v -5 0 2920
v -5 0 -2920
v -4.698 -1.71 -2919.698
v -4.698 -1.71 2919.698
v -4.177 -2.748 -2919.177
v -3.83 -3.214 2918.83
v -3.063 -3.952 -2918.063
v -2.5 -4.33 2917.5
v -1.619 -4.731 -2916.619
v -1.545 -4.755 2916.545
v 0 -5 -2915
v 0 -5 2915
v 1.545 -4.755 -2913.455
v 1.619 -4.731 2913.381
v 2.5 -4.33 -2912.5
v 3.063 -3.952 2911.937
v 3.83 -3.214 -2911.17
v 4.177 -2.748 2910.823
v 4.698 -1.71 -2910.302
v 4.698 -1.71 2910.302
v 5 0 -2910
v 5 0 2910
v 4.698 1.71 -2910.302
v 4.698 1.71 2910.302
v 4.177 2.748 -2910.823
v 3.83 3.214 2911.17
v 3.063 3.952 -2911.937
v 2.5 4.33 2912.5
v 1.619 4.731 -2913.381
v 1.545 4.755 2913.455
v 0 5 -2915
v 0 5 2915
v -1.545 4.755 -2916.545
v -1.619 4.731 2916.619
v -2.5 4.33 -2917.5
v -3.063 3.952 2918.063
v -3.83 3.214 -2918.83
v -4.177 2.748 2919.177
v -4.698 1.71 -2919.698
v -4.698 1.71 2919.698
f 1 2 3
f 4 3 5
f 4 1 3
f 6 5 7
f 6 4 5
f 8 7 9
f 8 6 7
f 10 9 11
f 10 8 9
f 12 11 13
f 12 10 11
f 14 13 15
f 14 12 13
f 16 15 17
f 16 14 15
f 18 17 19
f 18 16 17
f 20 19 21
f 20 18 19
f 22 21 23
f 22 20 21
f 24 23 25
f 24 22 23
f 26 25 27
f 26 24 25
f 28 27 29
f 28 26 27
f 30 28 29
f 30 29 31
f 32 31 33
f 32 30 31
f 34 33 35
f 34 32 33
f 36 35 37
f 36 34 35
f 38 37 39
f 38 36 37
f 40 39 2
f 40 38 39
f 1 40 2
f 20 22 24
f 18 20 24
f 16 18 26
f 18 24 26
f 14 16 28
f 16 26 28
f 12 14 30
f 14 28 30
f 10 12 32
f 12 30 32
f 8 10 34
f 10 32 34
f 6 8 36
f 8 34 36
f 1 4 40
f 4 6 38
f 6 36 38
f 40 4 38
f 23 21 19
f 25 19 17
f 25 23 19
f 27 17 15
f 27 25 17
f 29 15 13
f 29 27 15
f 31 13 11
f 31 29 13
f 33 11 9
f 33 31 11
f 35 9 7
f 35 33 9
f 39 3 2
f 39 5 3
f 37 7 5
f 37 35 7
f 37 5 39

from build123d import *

# Parameters (mm, degrees)
ESBO_O1_R                = 5
RESSALTO_EXTRUS_O1_DEPTH = 2920
CORTE_EXTRUS_O1_DEPTH    = 5


with BuildPart() as part:
    # Esboço1 → Ressalto-extrusão1 (new, symmetric)
    with BuildSketch(Plane.XY):
        with Locations(Location((0, 0, 0), (0, 0, 180))):
            Circle(ESBO_O1_R)
    extrude(amount=RESSALTO_EXTRUS_O1_DEPTH, both=True)

    # Esboço2 → Corte-extrusão1 (cut, symmetric)
    with BuildSketch(Plane(origin=(0, 0, 0), x_dir=(1, 0, 0), z_dir=(0, 1, 0))):
        Polygon((-5, -2920), (5, -2920), (5, -2910), align=None)
    corte_extrus_o1 = extrude(amount=CORTE_EXTRUS_O1_DEPTH, both=True, mode=Mode.SUBTRACT)

    # Espelhar1: Corte-extrusão1 across plane
    add(corte_extrus_o1.mirror(Plane.XY), mode=Mode.SUBTRACT)


solid = part.part
